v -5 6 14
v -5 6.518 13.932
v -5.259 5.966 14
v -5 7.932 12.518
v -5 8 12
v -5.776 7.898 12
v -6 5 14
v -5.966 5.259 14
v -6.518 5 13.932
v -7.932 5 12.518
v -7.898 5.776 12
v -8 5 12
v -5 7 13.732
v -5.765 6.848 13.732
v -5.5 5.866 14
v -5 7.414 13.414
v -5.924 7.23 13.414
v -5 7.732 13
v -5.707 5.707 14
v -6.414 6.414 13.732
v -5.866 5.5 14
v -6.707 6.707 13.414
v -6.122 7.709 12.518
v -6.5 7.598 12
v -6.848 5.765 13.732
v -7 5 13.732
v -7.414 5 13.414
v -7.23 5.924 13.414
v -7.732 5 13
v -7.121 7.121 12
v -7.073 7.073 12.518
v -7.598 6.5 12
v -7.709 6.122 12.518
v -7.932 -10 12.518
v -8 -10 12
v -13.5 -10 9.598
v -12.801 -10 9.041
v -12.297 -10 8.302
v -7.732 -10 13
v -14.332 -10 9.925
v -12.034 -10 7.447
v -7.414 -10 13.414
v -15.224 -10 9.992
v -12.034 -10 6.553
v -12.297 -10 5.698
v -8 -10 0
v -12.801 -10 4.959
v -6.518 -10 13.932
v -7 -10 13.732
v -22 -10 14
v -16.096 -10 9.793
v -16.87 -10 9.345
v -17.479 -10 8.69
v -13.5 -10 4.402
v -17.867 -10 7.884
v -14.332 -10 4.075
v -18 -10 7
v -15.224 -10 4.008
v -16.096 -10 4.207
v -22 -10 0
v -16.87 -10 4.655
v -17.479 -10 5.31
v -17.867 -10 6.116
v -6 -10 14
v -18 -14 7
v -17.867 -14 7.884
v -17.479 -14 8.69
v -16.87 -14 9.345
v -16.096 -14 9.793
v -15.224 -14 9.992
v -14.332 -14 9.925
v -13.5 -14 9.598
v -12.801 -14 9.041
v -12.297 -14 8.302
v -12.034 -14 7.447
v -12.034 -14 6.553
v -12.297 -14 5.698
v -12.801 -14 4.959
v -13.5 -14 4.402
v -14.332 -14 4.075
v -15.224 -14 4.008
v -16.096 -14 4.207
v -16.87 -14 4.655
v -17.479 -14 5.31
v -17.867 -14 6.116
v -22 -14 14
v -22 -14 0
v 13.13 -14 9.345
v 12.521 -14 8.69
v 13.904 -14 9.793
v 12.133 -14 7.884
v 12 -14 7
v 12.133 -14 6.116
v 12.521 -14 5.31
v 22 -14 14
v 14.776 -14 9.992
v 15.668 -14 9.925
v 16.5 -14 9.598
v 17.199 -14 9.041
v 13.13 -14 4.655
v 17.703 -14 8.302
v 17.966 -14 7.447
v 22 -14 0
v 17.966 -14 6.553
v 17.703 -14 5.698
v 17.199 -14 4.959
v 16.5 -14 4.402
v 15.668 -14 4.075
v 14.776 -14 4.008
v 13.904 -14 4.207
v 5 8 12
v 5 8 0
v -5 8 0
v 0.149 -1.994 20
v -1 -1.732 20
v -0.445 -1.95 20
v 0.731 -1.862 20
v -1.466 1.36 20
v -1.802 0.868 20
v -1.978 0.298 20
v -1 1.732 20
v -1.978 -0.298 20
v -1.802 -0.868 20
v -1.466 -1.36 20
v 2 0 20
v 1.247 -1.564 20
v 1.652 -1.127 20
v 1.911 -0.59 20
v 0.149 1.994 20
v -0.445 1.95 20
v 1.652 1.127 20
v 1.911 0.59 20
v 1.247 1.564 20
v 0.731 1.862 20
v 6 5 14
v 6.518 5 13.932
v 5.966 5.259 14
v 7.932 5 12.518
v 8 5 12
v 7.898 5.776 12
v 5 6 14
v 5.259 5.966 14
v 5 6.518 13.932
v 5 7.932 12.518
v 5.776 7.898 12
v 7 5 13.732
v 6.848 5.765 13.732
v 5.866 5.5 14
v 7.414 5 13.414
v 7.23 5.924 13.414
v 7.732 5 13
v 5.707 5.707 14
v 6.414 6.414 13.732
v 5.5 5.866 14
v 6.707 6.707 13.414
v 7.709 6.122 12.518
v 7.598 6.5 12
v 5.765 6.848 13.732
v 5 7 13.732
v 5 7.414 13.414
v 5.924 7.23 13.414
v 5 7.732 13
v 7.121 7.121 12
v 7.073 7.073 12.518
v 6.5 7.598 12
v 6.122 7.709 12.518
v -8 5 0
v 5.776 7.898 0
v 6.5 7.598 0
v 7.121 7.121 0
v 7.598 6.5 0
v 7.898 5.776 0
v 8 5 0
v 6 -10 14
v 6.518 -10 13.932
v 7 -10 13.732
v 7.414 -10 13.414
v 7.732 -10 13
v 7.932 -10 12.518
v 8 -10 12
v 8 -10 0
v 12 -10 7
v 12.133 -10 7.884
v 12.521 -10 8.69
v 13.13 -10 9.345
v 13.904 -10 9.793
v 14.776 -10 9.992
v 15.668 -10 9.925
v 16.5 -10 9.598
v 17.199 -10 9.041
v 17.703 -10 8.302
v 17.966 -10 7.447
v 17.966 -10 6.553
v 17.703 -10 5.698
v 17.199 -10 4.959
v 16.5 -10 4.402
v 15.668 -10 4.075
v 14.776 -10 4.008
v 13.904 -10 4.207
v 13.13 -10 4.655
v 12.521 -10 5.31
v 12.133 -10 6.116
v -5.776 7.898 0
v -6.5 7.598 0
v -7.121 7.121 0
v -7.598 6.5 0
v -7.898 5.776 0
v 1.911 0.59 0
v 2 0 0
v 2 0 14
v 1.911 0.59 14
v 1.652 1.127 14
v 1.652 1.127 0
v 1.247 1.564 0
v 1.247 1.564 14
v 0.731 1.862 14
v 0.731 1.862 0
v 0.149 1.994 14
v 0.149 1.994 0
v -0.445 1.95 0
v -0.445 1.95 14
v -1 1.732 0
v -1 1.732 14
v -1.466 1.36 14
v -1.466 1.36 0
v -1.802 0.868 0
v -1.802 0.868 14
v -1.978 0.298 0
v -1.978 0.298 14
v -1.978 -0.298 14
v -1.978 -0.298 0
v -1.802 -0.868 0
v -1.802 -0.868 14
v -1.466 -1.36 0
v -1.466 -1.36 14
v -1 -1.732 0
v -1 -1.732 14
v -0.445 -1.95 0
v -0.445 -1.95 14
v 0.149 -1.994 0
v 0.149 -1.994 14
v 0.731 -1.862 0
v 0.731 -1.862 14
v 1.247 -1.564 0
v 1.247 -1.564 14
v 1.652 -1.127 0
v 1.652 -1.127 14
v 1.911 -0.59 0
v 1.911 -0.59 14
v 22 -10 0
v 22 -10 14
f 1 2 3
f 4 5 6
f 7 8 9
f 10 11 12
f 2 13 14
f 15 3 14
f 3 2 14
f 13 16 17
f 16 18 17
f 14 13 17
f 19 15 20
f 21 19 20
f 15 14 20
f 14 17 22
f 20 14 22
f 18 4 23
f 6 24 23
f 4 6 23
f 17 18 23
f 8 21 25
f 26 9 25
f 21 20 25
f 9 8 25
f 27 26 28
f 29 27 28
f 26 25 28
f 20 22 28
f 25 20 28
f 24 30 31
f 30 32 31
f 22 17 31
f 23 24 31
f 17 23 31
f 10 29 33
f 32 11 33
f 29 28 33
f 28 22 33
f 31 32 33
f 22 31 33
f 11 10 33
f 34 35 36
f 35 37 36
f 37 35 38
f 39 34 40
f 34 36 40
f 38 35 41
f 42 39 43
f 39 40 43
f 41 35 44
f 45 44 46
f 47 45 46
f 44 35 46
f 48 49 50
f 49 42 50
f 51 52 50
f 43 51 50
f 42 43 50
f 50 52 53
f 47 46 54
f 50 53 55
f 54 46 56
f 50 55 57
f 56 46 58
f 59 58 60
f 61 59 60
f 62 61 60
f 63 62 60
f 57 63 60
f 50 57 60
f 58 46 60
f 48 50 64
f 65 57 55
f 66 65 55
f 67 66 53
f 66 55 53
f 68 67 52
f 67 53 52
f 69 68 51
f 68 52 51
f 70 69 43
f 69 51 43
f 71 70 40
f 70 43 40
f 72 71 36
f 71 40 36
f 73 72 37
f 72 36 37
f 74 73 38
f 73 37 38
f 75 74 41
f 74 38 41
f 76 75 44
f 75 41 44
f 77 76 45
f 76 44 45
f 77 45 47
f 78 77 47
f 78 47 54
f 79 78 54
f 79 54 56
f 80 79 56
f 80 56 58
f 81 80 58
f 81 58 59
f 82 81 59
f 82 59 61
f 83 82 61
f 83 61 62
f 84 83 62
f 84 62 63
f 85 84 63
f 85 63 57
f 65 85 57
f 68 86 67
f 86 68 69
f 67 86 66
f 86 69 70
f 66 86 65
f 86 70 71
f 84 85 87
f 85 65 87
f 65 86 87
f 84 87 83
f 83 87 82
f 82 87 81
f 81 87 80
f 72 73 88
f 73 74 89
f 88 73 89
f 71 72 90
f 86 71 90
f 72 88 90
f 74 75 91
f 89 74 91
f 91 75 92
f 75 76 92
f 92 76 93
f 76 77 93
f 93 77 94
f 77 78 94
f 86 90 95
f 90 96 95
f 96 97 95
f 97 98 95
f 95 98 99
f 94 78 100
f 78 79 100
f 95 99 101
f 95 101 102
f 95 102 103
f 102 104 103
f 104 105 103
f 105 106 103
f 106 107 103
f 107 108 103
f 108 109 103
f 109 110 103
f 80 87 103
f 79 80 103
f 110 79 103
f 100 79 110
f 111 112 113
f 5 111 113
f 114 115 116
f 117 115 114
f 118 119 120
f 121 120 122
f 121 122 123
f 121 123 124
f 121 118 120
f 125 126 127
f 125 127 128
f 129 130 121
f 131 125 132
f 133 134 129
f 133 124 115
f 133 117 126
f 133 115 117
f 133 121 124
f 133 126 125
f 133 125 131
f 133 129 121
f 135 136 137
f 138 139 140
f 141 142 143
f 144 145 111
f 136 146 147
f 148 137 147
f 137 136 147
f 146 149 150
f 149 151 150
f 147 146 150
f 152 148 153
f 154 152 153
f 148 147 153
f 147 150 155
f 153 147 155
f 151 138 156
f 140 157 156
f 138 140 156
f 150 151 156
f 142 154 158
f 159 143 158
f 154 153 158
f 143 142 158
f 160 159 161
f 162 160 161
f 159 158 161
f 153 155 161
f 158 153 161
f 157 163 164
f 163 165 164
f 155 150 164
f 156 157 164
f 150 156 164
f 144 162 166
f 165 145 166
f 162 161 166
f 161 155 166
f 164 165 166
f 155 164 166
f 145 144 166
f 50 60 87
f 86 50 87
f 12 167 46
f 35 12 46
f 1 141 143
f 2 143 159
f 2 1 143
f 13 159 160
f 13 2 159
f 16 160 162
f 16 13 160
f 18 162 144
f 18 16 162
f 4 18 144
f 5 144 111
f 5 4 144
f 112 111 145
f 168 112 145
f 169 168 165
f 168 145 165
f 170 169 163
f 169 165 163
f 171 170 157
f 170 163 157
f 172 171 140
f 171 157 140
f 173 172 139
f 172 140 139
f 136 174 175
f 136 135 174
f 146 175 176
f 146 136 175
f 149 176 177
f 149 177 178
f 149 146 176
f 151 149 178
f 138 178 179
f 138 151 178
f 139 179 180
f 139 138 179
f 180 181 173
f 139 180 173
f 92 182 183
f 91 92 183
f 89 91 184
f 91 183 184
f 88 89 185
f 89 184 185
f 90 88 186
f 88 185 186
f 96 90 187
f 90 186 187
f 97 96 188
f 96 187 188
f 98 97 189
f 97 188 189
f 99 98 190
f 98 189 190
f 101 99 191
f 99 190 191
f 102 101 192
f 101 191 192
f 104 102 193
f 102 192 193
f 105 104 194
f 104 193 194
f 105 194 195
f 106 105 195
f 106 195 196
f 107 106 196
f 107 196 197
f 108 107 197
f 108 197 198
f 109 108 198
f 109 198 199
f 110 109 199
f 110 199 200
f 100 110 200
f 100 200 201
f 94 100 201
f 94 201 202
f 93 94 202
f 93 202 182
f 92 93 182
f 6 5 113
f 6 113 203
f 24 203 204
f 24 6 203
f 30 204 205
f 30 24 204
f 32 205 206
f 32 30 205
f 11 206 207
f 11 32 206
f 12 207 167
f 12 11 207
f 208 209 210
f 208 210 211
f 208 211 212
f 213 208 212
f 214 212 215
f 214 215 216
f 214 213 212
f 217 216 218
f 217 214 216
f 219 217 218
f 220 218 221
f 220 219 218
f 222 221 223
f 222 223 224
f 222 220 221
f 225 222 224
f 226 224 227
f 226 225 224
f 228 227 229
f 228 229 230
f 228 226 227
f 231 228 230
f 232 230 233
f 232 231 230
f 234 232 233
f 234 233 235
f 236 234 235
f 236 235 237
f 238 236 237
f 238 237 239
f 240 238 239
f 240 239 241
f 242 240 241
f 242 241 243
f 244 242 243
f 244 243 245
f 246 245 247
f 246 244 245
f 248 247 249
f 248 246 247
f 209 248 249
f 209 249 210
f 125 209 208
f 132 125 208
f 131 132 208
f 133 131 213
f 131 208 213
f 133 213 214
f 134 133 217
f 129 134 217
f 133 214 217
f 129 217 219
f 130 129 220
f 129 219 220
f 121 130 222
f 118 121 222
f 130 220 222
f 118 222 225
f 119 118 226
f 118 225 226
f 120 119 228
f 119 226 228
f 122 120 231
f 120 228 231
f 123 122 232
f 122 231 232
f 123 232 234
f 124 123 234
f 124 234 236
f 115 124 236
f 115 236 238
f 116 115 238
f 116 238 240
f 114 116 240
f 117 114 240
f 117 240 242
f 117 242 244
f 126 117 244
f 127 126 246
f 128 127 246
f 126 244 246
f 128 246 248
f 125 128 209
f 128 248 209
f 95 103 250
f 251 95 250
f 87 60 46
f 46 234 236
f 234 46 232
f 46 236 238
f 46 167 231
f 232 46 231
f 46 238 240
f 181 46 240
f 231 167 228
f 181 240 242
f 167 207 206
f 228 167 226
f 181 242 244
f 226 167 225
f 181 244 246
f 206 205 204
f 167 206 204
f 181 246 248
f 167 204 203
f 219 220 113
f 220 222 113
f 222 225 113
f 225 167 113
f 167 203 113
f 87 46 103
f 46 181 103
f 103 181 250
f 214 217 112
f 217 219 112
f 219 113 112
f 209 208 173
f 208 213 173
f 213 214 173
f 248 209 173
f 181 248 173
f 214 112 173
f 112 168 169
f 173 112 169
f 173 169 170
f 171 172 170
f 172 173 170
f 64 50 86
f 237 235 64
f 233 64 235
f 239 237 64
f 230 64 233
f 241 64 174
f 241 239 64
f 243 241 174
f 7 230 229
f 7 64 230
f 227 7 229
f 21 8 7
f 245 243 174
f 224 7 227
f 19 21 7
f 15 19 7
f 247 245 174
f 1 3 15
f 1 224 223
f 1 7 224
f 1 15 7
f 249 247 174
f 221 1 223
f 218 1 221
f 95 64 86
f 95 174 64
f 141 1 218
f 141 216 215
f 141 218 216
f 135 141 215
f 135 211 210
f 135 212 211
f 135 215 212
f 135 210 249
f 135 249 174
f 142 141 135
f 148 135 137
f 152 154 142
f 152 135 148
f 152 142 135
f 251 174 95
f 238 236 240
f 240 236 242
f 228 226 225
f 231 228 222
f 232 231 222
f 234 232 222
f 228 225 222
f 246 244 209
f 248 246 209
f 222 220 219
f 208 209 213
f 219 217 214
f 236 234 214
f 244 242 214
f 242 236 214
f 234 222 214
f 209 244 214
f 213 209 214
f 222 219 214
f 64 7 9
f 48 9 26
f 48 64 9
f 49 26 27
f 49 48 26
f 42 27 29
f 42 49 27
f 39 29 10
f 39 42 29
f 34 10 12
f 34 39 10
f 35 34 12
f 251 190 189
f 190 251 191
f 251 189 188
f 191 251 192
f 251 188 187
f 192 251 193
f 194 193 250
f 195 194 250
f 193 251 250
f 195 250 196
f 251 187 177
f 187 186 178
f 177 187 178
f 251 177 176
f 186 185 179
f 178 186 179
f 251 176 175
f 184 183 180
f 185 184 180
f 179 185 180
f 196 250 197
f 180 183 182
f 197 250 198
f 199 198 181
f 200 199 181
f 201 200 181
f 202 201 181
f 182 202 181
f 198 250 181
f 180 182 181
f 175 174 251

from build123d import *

# Parameters (mm, degrees)
F0_R     = 2
F1_DEPTH = 20
F2_DEPTH = 14
F3_R     = 3
F5_DEPTH = 4.001
F4_R     = 3
F6_DEPTH = 4.001
F7_R     = 3
F8_R     = 3
F9_R     = 2


with BuildPart() as f1:
    # F0 (on Top) → F1 (new body)
    with BuildSketch(Plane.XY):
        Circle(F0_R)
    extrude(amount=F1_DEPTH)


with BuildPart() as f2:
    # F0 (on Top) → F2 (new body)
    with BuildSketch(Plane.XY):
        Polygon((8, 8), (-8, 8), (-8, -10), (-22, -10), (-22, -14), (22, -14), (22, -10), (8, -10), align=None)
        Circle(F0_R, mode=Mode.SUBTRACT)
    extrude(amount=F2_DEPTH)

    # F3 (on face) → F5 (cut, through all)
    with BuildSketch(Plane(origin=(0, -10, 0), x_dir=(-1, 0, 0), z_dir=(0, 1, 0))):
        with Locations((15, 7)):
            Circle(F3_R)
    extrude(amount=-F5_DEPTH, mode=Mode.SUBTRACT)

    # F4 (on face) → F6 (cut, through all)
    with BuildSketch(Plane(origin=(0, -10, 0), x_dir=(-1, 0, 0), z_dir=(0, 1, 0))):
        with Locations((-15, 7)):
            Circle(F4_R)
    extrude(amount=-F6_DEPTH, mode=Mode.SUBTRACT)

    # F7
    f7_edges = [f2.edges().sort_by_distance(p)[0] for p in [
        (-8, 8, 7),
    ]]
    fillet(f7_edges, radius=F7_R)

    # F8
    f8_edges = [f2.edges().sort_by_distance(p)[0] for p in [
        (8, 8, 7),
    ]]
    fillet(f8_edges, radius=F8_R)

    # F9
    f9_edges = [f2.edges().sort_by_distance(p)[0] for p in [
        (-8, -2.5, 14),
    ]]
    fillet(f9_edges, radius=F9_R)


solid = Compound([f1.part, f2.part])
